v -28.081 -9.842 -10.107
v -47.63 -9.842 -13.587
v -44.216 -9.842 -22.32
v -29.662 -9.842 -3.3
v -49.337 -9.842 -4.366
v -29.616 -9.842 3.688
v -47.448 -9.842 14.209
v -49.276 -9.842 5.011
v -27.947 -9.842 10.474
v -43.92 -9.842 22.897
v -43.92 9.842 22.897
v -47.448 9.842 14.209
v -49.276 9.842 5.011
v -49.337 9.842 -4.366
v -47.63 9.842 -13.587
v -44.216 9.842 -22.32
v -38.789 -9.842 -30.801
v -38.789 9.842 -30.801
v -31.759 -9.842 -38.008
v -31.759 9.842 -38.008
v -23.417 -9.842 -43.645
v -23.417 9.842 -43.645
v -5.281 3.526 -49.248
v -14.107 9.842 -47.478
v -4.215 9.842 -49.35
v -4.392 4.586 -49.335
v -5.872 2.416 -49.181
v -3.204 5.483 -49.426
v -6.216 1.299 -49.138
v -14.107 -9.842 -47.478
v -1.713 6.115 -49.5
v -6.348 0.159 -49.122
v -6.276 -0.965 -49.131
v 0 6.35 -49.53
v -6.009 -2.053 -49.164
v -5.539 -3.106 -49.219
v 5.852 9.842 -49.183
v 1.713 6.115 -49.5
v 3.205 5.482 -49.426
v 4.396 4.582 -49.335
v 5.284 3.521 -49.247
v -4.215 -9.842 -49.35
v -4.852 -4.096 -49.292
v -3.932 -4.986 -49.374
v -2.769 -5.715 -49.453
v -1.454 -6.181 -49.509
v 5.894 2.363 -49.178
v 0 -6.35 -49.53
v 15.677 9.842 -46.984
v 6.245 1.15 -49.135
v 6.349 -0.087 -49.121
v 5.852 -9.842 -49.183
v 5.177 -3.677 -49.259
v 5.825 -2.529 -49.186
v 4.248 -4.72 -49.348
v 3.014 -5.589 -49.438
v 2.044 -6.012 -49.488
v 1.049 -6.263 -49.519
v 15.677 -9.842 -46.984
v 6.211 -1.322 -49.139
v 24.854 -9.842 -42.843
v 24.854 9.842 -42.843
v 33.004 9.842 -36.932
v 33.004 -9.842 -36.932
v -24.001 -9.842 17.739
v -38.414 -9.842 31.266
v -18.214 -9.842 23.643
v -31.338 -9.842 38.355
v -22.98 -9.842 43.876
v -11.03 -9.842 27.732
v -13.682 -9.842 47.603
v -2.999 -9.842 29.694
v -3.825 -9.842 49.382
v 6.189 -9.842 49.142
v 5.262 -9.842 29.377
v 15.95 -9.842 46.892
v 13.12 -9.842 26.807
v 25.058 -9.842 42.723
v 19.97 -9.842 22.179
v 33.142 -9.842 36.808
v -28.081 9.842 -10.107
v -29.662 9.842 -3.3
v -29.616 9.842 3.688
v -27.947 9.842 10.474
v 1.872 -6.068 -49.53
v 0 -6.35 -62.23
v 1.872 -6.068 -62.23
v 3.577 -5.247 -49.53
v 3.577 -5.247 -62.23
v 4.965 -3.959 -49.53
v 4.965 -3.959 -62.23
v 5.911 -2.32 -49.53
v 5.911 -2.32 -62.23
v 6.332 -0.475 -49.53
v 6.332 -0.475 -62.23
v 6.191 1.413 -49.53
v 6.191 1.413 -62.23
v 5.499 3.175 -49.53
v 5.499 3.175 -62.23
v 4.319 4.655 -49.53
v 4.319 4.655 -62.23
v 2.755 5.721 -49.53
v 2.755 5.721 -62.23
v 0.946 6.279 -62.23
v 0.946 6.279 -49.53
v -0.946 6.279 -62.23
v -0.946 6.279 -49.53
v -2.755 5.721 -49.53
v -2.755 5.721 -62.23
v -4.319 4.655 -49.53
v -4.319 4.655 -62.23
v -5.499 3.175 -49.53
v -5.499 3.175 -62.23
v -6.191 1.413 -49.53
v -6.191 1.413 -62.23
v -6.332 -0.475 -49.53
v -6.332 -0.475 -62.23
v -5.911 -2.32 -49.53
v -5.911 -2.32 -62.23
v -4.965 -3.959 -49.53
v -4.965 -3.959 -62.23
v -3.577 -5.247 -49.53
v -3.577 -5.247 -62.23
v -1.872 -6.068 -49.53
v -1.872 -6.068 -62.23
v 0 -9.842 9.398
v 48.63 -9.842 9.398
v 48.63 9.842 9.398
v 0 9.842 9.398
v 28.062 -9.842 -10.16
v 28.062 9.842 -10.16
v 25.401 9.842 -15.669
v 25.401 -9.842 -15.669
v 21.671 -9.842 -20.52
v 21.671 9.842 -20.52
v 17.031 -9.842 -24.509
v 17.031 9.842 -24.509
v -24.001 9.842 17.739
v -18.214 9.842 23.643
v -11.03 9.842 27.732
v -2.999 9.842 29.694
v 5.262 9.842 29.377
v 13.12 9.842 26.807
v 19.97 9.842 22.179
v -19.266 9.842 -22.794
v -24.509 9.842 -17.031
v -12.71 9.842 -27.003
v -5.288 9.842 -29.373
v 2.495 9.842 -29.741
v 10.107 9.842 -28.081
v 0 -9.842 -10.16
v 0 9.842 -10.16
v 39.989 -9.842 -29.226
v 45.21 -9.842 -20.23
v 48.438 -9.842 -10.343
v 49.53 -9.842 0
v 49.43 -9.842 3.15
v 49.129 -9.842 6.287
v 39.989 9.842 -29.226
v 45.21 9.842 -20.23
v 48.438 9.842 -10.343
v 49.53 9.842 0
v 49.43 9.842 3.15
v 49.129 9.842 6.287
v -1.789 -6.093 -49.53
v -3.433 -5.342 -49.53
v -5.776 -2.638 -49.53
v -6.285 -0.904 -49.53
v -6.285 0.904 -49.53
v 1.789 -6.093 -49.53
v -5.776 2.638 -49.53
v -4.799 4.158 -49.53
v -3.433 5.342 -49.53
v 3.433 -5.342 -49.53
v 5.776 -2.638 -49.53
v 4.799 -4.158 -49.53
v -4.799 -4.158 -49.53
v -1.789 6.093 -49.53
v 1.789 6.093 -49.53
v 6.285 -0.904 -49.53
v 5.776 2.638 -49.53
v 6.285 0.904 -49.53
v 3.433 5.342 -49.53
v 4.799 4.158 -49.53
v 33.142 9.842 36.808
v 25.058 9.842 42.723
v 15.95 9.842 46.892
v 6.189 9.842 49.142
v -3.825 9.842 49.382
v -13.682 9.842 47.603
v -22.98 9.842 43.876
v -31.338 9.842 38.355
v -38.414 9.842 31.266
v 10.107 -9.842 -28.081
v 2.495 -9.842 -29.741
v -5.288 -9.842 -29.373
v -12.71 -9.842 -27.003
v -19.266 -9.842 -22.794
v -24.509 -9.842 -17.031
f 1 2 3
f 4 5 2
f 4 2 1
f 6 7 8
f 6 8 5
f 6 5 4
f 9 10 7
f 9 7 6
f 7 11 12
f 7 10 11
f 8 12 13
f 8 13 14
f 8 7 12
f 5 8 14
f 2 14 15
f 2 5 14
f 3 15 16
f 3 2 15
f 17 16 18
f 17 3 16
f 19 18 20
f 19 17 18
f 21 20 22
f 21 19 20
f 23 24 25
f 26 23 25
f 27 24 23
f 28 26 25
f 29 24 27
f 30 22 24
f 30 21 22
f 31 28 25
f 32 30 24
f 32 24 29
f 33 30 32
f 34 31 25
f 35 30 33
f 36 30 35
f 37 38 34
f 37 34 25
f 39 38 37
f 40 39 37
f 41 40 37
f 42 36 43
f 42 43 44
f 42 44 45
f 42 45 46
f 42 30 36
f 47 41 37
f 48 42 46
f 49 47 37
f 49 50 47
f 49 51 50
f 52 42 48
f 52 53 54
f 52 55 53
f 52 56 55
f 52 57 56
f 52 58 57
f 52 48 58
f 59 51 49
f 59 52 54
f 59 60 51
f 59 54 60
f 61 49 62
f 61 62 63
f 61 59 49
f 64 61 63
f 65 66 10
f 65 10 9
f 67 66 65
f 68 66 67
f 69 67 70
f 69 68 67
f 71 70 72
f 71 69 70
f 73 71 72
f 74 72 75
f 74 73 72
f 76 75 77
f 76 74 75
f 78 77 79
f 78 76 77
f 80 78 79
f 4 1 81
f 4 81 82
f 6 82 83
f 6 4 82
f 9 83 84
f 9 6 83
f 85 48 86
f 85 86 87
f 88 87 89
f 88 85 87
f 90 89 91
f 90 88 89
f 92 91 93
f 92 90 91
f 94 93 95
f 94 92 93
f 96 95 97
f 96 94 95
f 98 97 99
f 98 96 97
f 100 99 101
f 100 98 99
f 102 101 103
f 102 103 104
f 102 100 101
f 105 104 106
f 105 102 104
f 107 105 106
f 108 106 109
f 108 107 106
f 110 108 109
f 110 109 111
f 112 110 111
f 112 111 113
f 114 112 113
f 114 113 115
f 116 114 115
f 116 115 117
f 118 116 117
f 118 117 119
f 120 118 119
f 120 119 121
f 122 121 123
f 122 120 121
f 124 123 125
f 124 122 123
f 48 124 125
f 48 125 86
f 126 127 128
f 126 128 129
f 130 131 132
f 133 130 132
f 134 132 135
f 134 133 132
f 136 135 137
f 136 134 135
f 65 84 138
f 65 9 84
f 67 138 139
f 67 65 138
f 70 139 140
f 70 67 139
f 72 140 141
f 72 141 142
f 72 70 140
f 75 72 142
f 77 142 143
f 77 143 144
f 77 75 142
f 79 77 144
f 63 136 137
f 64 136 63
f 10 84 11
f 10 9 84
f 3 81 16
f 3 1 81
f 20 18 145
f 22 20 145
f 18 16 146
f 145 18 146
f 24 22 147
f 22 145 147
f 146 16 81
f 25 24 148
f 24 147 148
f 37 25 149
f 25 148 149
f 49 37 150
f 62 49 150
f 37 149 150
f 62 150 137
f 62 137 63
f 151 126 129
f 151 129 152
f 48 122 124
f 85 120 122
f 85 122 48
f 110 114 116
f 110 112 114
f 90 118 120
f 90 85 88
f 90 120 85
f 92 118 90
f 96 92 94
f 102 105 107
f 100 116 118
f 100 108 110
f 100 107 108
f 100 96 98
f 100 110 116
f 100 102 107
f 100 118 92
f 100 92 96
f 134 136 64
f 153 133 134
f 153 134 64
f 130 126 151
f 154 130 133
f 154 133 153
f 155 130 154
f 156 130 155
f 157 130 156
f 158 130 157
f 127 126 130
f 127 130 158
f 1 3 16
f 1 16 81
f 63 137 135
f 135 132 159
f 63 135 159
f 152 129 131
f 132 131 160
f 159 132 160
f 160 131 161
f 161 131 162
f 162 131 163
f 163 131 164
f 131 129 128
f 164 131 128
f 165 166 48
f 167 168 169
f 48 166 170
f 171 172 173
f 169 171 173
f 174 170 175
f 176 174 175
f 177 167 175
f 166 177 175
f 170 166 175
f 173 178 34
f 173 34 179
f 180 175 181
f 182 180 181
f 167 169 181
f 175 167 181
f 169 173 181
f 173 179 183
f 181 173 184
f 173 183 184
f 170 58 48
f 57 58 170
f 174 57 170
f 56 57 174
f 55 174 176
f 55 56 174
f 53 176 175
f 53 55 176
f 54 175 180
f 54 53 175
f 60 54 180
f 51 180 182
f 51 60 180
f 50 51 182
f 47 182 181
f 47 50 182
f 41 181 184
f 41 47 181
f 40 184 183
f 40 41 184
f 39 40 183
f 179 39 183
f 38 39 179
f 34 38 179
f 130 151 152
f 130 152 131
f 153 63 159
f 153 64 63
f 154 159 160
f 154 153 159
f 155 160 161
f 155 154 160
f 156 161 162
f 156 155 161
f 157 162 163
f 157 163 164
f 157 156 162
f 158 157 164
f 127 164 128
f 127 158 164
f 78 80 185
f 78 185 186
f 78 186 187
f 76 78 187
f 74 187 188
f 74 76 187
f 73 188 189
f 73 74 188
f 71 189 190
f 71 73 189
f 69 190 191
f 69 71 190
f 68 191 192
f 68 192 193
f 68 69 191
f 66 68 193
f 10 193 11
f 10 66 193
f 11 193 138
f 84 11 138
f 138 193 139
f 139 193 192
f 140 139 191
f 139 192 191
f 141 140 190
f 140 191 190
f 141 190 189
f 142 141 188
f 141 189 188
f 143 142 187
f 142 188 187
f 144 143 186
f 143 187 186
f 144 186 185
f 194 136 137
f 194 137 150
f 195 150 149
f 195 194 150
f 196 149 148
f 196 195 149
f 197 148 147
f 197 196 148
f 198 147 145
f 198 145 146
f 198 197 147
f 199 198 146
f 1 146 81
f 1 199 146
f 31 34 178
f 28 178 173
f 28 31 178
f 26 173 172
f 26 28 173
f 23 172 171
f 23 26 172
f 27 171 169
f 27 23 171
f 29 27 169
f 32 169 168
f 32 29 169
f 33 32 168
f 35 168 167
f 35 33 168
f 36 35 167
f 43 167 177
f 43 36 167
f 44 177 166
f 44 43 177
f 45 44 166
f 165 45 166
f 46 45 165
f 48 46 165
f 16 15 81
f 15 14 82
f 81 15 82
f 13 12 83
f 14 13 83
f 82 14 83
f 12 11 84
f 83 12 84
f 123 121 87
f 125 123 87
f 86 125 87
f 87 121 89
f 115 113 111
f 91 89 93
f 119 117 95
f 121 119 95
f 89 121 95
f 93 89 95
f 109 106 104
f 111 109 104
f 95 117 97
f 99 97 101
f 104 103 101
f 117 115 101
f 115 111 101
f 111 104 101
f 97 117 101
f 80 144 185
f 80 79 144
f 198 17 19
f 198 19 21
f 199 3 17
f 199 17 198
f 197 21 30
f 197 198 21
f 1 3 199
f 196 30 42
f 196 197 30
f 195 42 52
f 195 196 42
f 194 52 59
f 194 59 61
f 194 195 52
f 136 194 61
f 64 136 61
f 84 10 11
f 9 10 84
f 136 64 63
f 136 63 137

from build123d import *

# Parameters (mm, degrees)
F1_DEPTH = 9.8425
F2_DEPTH = 9.8425
F4_START = -45.72
F3_R     = 6.35
F4_DEPTH = 3.81
F5_DEPTH = 12.7


with BuildPart() as f1:
    # F0 (on Front) → F1 (new body, symmetric)
    with BuildSketch(Plane.XZ):
        with BuildLine():
            Line((19.9702029468, 22.1791573164), (33.142038933, 36.8079632059))
            ThreePointArc((33.142038933, 36.8079632059), (-8.7986103434, 48.7422338022), (-43.919624031, 22.8973257167))
            Line((-43.919624031, 22.8973257167), (-27.9467375514, 10.4739622509))
            ThreePointArc((-27.9467375514, 10.4739622509), (-7.0823141666, 28.9924964611), (19.9702029468, 22.1791573164))
        make_face()
    extrude(amount=F1_DEPTH, both=True)


with BuildPart() as f1b:
    # F0 (on Front) → F1, piece 2 (new body, symmetric)
    with BuildSketch(Plane.XZ):
        with BuildLine():
            ThreePointArc((-44.2155780636, -22.320473931), (-9.2087159364, -48.666420156), (33.003755918, -36.9320050268))
            Line((33.003755918, -36.9320050268), (17.0308694384, -24.5086415611))
            ThreePointArc((17.0308694384, -24.5086415611), (-9.0762762319, -28.4314128168), (-28.0814432165, -10.1072534291))
            Line((-28.0814432165, -10.1072534291), (-44.2155780636, -22.320473931))
        make_face()
    extrude(amount=F1_DEPTH, both=True)

    # F3 (on Top) → F4 (join)
    with BuildSketch(Plane.XY.offset(F4_START)):
        Circle(F3_R)
    extrude(amount=-F4_DEPTH)


with BuildPart() as f2:
    # F0 (on Front) → F2 (new body, symmetric)
    with BuildSketch(Plane.XZ):
        with BuildLine():
            ThreePointArc((-43.919624031, 22.8973257167), (-49.5289391498, 0.3241707775), (-44.2155780636, -22.320473931))
            Line((-44.2155780636, -22.320473931), (-28.0814432165, -10.1072534291))
            ThreePointArc((-28.0814432165, -10.1072534291), (-29.8443607698, 0.1953336736), (-27.9467375514, 10.4739622509))
            Line((-27.9467375514, 10.4739622509), (-43.919624031, 22.8973257167))
        make_face()
    extrude(amount=F2_DEPTH, both=True)


with BuildPart() as f2b:
    # F0 (on Front) → F2, piece 2 (new body, symmetric)
    with BuildSketch(Plane.XZ):
        with BuildLine():
            ThreePointArc((33.003755918, -36.9320050268), (45.2100482781, -20.2304828091), (49.53, 0))
            ThreePointArc((49.53, 0), (49.304542376, 4.7204873787), (48.6302220435, 9.398))
            Line((48.6302220435, 9.398), (28.3266944948, 9.398))
            Line((28.3266944948, 9.398), (8.4619972083, 9.398))
            Line((8.4619972083, 9.398), (0, 9.398))
            Line((0, 9.398), (0, -10.16))
            Line((0, -10.16), (28.0624023384, -10.16))
            ThreePointArc((28.0624023384, -10.16), (23.6605508927, -18.1907217134), (17.0308694384, -24.5086415611))
            Line((17.0308694384, -24.5086415611), (33.003755918, -36.9320050268))
        make_face()
    extrude(amount=F2_DEPTH, both=True)


with BuildPart() as f5:
    # F5 (new): a face of the model
    f5_faces = [f1b.part.faces().sort_by_distance(p)[0] for p in [
        (0, 0, -49.53),
    ]]
    extrude(f5_faces, amount=F5_DEPTH)


solid = Compound([f1.part, f1b.part, f2.part, f2b.part, f5.part])
